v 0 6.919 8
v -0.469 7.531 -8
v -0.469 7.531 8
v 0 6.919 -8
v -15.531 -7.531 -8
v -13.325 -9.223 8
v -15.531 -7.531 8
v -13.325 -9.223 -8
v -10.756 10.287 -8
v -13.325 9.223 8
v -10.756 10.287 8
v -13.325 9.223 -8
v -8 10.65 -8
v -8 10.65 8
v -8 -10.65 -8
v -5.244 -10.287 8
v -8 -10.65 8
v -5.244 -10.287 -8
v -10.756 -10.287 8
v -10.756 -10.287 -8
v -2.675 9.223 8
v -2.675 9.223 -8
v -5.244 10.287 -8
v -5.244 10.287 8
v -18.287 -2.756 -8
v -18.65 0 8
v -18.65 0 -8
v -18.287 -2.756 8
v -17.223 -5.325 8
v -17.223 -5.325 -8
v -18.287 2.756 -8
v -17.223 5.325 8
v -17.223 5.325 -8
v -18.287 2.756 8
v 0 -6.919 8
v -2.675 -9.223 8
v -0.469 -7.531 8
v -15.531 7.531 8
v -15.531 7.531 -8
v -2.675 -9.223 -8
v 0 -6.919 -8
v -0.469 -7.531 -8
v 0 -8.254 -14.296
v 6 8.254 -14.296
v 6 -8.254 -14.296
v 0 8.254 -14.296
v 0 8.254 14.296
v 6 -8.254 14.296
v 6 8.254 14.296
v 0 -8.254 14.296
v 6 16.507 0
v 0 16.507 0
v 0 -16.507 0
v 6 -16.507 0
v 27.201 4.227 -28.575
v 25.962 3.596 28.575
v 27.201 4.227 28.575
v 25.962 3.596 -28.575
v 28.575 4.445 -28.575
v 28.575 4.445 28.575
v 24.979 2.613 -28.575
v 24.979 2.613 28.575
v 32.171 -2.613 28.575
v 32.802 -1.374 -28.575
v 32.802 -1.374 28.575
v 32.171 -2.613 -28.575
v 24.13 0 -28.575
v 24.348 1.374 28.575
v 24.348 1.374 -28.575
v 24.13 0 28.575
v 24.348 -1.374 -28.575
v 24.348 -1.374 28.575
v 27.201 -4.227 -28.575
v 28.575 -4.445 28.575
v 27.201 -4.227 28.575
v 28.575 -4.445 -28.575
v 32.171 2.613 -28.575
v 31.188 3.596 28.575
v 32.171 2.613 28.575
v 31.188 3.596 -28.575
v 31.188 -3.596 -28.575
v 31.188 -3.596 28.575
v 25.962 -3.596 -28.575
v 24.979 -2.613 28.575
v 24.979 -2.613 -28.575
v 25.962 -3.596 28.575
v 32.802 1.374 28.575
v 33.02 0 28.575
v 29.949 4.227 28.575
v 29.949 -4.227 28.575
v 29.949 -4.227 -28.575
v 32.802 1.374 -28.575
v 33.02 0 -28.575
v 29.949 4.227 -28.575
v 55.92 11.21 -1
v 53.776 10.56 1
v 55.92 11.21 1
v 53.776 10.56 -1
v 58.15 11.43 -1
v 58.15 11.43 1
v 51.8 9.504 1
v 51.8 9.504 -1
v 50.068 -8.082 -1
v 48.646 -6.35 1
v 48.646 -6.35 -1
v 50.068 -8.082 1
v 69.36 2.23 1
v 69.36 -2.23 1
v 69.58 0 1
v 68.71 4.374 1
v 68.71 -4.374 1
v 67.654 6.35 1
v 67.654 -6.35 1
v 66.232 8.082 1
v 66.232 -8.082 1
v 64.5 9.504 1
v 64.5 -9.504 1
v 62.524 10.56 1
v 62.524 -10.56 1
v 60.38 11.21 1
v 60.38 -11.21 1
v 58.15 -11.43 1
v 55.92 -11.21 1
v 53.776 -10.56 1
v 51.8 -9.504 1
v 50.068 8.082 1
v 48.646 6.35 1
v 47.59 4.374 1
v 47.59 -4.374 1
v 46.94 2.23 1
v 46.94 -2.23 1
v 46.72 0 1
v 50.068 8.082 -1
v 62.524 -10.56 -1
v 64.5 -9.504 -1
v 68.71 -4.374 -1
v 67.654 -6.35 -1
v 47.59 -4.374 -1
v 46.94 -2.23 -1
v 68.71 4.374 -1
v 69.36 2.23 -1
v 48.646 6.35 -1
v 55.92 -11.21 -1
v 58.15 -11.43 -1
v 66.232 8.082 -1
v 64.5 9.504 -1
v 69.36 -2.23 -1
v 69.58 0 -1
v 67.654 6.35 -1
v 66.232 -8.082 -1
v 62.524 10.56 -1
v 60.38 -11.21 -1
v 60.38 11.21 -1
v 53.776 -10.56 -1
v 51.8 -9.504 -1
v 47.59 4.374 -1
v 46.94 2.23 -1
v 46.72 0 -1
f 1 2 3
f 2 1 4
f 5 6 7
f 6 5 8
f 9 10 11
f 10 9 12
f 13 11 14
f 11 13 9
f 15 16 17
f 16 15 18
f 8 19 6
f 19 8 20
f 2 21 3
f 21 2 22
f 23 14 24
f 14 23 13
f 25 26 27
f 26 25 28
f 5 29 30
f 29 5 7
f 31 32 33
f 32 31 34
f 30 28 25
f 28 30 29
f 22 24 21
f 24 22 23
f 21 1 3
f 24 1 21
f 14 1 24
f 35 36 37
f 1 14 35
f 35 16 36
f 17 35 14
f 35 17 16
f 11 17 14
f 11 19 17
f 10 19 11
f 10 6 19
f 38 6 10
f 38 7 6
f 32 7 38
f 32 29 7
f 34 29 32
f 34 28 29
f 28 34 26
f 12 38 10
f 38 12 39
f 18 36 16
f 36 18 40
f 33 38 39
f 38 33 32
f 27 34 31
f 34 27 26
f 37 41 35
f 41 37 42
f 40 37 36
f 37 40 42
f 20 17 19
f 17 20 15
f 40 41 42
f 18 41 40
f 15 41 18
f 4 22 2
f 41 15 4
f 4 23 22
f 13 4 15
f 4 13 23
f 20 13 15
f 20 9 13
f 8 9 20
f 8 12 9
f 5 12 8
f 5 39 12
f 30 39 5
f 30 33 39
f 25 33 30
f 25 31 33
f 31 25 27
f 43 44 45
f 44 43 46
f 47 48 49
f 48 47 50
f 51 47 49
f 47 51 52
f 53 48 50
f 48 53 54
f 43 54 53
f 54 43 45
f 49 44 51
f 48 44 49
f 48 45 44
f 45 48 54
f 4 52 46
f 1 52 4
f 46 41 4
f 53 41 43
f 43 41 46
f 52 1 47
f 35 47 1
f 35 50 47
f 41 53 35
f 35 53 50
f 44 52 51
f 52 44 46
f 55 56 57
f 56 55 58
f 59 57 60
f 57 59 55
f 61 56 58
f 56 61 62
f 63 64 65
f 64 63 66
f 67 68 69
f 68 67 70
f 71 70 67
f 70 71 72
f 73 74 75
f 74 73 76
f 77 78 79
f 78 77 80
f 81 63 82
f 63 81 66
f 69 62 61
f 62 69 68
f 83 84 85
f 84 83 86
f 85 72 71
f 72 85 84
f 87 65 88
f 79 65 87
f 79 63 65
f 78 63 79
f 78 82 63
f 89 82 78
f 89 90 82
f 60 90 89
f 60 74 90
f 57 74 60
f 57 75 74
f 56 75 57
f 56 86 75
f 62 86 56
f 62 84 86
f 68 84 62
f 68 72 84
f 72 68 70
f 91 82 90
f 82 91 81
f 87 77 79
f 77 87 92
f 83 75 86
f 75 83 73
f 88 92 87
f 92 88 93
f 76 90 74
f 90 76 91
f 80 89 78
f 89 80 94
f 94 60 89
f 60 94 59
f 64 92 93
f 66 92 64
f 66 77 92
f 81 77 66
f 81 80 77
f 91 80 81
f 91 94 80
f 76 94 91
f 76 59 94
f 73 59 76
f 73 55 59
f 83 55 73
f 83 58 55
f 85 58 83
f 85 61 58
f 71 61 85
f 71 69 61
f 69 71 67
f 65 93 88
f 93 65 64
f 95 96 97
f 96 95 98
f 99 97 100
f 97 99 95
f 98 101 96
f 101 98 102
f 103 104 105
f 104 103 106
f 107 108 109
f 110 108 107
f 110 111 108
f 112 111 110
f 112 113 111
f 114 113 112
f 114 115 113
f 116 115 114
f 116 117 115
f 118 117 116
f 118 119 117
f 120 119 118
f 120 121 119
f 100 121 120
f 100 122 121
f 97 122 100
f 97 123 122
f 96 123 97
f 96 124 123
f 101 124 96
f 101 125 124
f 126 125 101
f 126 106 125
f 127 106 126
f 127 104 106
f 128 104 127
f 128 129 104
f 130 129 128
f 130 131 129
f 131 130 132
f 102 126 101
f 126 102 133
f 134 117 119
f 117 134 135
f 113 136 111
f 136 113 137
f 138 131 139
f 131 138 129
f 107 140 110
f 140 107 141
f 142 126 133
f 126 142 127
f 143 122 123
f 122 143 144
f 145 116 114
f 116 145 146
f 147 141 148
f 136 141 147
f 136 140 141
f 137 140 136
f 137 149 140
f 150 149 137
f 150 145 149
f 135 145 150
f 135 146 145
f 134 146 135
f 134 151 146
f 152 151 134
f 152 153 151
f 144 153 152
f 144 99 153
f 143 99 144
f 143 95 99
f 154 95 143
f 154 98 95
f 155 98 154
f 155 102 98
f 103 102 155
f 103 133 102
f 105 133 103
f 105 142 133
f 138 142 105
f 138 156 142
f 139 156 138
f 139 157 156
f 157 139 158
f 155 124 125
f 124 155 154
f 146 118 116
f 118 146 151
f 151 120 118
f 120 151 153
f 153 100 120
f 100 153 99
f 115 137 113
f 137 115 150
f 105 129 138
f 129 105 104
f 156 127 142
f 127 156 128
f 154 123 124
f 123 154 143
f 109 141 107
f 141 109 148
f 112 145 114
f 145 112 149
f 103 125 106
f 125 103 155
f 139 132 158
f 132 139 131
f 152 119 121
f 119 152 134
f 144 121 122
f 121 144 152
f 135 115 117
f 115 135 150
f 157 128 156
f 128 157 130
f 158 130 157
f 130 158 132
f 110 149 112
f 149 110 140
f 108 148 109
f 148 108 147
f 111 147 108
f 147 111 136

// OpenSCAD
// Auto-generated by scripts/author_from_manifest.py (Phase D.3).
// Source: data/phase_d_manifest.json (sku_intent='tyco-ty3331-sidewall-135f').
// Do not hand-edit — regenerate from the manifest.
//
// @part tyco_ty3331_sidewall_135f
// @kind sprinkler_head
// @category head.sidewall.k56
// @display-name "Tyco TY3331 Horizontal Sidewall K5.6 135°F"
// @mfg tyco_fire_protection
// @mfg-pn TY3331
// @listing UL FM
// @hazard-classes LH OH1
// @price-usd 15.80
// @install-minutes 8
// @crew journeyman
// @k-factor 5.6
// @orientation sidewall
// @response standard
// @temperature 135F
// @param size_in number default=0.5 label="Size" unit="in"
// @port inlet position=[0,0.014,0] direction=[0,1,0] style=NPT_threaded size_in=0.5 role=drop

size_in = 0.5;
k_factor = 5.6;

length_mm   = 57.15;
body_dia_mm = 25.40;
thread_od   = 21.3;
thread_len  = 16;
deflector_d = body_dia_mm * 0.9;

rotate([0,0,90]) union() {
    translate([0, thread_len/2, 0])
        cylinder(h = thread_len, d = thread_od, center = true, $fn = 24);
    translate([0, -3, 0])
        rotate([90, 0, 0])
        cylinder(h = 6, d = thread_od * 1.55, $fn = 6, center = true);
    translate([0, -length_mm/2, 0])
        cylinder(h = length_mm, d = body_dia_mm * 0.35, center = true, $fn = 20);
    translate([0, -length_mm - 1, 0])
        cylinder(h = 2, d = deflector_d, center = true, $fn = 32);
}
